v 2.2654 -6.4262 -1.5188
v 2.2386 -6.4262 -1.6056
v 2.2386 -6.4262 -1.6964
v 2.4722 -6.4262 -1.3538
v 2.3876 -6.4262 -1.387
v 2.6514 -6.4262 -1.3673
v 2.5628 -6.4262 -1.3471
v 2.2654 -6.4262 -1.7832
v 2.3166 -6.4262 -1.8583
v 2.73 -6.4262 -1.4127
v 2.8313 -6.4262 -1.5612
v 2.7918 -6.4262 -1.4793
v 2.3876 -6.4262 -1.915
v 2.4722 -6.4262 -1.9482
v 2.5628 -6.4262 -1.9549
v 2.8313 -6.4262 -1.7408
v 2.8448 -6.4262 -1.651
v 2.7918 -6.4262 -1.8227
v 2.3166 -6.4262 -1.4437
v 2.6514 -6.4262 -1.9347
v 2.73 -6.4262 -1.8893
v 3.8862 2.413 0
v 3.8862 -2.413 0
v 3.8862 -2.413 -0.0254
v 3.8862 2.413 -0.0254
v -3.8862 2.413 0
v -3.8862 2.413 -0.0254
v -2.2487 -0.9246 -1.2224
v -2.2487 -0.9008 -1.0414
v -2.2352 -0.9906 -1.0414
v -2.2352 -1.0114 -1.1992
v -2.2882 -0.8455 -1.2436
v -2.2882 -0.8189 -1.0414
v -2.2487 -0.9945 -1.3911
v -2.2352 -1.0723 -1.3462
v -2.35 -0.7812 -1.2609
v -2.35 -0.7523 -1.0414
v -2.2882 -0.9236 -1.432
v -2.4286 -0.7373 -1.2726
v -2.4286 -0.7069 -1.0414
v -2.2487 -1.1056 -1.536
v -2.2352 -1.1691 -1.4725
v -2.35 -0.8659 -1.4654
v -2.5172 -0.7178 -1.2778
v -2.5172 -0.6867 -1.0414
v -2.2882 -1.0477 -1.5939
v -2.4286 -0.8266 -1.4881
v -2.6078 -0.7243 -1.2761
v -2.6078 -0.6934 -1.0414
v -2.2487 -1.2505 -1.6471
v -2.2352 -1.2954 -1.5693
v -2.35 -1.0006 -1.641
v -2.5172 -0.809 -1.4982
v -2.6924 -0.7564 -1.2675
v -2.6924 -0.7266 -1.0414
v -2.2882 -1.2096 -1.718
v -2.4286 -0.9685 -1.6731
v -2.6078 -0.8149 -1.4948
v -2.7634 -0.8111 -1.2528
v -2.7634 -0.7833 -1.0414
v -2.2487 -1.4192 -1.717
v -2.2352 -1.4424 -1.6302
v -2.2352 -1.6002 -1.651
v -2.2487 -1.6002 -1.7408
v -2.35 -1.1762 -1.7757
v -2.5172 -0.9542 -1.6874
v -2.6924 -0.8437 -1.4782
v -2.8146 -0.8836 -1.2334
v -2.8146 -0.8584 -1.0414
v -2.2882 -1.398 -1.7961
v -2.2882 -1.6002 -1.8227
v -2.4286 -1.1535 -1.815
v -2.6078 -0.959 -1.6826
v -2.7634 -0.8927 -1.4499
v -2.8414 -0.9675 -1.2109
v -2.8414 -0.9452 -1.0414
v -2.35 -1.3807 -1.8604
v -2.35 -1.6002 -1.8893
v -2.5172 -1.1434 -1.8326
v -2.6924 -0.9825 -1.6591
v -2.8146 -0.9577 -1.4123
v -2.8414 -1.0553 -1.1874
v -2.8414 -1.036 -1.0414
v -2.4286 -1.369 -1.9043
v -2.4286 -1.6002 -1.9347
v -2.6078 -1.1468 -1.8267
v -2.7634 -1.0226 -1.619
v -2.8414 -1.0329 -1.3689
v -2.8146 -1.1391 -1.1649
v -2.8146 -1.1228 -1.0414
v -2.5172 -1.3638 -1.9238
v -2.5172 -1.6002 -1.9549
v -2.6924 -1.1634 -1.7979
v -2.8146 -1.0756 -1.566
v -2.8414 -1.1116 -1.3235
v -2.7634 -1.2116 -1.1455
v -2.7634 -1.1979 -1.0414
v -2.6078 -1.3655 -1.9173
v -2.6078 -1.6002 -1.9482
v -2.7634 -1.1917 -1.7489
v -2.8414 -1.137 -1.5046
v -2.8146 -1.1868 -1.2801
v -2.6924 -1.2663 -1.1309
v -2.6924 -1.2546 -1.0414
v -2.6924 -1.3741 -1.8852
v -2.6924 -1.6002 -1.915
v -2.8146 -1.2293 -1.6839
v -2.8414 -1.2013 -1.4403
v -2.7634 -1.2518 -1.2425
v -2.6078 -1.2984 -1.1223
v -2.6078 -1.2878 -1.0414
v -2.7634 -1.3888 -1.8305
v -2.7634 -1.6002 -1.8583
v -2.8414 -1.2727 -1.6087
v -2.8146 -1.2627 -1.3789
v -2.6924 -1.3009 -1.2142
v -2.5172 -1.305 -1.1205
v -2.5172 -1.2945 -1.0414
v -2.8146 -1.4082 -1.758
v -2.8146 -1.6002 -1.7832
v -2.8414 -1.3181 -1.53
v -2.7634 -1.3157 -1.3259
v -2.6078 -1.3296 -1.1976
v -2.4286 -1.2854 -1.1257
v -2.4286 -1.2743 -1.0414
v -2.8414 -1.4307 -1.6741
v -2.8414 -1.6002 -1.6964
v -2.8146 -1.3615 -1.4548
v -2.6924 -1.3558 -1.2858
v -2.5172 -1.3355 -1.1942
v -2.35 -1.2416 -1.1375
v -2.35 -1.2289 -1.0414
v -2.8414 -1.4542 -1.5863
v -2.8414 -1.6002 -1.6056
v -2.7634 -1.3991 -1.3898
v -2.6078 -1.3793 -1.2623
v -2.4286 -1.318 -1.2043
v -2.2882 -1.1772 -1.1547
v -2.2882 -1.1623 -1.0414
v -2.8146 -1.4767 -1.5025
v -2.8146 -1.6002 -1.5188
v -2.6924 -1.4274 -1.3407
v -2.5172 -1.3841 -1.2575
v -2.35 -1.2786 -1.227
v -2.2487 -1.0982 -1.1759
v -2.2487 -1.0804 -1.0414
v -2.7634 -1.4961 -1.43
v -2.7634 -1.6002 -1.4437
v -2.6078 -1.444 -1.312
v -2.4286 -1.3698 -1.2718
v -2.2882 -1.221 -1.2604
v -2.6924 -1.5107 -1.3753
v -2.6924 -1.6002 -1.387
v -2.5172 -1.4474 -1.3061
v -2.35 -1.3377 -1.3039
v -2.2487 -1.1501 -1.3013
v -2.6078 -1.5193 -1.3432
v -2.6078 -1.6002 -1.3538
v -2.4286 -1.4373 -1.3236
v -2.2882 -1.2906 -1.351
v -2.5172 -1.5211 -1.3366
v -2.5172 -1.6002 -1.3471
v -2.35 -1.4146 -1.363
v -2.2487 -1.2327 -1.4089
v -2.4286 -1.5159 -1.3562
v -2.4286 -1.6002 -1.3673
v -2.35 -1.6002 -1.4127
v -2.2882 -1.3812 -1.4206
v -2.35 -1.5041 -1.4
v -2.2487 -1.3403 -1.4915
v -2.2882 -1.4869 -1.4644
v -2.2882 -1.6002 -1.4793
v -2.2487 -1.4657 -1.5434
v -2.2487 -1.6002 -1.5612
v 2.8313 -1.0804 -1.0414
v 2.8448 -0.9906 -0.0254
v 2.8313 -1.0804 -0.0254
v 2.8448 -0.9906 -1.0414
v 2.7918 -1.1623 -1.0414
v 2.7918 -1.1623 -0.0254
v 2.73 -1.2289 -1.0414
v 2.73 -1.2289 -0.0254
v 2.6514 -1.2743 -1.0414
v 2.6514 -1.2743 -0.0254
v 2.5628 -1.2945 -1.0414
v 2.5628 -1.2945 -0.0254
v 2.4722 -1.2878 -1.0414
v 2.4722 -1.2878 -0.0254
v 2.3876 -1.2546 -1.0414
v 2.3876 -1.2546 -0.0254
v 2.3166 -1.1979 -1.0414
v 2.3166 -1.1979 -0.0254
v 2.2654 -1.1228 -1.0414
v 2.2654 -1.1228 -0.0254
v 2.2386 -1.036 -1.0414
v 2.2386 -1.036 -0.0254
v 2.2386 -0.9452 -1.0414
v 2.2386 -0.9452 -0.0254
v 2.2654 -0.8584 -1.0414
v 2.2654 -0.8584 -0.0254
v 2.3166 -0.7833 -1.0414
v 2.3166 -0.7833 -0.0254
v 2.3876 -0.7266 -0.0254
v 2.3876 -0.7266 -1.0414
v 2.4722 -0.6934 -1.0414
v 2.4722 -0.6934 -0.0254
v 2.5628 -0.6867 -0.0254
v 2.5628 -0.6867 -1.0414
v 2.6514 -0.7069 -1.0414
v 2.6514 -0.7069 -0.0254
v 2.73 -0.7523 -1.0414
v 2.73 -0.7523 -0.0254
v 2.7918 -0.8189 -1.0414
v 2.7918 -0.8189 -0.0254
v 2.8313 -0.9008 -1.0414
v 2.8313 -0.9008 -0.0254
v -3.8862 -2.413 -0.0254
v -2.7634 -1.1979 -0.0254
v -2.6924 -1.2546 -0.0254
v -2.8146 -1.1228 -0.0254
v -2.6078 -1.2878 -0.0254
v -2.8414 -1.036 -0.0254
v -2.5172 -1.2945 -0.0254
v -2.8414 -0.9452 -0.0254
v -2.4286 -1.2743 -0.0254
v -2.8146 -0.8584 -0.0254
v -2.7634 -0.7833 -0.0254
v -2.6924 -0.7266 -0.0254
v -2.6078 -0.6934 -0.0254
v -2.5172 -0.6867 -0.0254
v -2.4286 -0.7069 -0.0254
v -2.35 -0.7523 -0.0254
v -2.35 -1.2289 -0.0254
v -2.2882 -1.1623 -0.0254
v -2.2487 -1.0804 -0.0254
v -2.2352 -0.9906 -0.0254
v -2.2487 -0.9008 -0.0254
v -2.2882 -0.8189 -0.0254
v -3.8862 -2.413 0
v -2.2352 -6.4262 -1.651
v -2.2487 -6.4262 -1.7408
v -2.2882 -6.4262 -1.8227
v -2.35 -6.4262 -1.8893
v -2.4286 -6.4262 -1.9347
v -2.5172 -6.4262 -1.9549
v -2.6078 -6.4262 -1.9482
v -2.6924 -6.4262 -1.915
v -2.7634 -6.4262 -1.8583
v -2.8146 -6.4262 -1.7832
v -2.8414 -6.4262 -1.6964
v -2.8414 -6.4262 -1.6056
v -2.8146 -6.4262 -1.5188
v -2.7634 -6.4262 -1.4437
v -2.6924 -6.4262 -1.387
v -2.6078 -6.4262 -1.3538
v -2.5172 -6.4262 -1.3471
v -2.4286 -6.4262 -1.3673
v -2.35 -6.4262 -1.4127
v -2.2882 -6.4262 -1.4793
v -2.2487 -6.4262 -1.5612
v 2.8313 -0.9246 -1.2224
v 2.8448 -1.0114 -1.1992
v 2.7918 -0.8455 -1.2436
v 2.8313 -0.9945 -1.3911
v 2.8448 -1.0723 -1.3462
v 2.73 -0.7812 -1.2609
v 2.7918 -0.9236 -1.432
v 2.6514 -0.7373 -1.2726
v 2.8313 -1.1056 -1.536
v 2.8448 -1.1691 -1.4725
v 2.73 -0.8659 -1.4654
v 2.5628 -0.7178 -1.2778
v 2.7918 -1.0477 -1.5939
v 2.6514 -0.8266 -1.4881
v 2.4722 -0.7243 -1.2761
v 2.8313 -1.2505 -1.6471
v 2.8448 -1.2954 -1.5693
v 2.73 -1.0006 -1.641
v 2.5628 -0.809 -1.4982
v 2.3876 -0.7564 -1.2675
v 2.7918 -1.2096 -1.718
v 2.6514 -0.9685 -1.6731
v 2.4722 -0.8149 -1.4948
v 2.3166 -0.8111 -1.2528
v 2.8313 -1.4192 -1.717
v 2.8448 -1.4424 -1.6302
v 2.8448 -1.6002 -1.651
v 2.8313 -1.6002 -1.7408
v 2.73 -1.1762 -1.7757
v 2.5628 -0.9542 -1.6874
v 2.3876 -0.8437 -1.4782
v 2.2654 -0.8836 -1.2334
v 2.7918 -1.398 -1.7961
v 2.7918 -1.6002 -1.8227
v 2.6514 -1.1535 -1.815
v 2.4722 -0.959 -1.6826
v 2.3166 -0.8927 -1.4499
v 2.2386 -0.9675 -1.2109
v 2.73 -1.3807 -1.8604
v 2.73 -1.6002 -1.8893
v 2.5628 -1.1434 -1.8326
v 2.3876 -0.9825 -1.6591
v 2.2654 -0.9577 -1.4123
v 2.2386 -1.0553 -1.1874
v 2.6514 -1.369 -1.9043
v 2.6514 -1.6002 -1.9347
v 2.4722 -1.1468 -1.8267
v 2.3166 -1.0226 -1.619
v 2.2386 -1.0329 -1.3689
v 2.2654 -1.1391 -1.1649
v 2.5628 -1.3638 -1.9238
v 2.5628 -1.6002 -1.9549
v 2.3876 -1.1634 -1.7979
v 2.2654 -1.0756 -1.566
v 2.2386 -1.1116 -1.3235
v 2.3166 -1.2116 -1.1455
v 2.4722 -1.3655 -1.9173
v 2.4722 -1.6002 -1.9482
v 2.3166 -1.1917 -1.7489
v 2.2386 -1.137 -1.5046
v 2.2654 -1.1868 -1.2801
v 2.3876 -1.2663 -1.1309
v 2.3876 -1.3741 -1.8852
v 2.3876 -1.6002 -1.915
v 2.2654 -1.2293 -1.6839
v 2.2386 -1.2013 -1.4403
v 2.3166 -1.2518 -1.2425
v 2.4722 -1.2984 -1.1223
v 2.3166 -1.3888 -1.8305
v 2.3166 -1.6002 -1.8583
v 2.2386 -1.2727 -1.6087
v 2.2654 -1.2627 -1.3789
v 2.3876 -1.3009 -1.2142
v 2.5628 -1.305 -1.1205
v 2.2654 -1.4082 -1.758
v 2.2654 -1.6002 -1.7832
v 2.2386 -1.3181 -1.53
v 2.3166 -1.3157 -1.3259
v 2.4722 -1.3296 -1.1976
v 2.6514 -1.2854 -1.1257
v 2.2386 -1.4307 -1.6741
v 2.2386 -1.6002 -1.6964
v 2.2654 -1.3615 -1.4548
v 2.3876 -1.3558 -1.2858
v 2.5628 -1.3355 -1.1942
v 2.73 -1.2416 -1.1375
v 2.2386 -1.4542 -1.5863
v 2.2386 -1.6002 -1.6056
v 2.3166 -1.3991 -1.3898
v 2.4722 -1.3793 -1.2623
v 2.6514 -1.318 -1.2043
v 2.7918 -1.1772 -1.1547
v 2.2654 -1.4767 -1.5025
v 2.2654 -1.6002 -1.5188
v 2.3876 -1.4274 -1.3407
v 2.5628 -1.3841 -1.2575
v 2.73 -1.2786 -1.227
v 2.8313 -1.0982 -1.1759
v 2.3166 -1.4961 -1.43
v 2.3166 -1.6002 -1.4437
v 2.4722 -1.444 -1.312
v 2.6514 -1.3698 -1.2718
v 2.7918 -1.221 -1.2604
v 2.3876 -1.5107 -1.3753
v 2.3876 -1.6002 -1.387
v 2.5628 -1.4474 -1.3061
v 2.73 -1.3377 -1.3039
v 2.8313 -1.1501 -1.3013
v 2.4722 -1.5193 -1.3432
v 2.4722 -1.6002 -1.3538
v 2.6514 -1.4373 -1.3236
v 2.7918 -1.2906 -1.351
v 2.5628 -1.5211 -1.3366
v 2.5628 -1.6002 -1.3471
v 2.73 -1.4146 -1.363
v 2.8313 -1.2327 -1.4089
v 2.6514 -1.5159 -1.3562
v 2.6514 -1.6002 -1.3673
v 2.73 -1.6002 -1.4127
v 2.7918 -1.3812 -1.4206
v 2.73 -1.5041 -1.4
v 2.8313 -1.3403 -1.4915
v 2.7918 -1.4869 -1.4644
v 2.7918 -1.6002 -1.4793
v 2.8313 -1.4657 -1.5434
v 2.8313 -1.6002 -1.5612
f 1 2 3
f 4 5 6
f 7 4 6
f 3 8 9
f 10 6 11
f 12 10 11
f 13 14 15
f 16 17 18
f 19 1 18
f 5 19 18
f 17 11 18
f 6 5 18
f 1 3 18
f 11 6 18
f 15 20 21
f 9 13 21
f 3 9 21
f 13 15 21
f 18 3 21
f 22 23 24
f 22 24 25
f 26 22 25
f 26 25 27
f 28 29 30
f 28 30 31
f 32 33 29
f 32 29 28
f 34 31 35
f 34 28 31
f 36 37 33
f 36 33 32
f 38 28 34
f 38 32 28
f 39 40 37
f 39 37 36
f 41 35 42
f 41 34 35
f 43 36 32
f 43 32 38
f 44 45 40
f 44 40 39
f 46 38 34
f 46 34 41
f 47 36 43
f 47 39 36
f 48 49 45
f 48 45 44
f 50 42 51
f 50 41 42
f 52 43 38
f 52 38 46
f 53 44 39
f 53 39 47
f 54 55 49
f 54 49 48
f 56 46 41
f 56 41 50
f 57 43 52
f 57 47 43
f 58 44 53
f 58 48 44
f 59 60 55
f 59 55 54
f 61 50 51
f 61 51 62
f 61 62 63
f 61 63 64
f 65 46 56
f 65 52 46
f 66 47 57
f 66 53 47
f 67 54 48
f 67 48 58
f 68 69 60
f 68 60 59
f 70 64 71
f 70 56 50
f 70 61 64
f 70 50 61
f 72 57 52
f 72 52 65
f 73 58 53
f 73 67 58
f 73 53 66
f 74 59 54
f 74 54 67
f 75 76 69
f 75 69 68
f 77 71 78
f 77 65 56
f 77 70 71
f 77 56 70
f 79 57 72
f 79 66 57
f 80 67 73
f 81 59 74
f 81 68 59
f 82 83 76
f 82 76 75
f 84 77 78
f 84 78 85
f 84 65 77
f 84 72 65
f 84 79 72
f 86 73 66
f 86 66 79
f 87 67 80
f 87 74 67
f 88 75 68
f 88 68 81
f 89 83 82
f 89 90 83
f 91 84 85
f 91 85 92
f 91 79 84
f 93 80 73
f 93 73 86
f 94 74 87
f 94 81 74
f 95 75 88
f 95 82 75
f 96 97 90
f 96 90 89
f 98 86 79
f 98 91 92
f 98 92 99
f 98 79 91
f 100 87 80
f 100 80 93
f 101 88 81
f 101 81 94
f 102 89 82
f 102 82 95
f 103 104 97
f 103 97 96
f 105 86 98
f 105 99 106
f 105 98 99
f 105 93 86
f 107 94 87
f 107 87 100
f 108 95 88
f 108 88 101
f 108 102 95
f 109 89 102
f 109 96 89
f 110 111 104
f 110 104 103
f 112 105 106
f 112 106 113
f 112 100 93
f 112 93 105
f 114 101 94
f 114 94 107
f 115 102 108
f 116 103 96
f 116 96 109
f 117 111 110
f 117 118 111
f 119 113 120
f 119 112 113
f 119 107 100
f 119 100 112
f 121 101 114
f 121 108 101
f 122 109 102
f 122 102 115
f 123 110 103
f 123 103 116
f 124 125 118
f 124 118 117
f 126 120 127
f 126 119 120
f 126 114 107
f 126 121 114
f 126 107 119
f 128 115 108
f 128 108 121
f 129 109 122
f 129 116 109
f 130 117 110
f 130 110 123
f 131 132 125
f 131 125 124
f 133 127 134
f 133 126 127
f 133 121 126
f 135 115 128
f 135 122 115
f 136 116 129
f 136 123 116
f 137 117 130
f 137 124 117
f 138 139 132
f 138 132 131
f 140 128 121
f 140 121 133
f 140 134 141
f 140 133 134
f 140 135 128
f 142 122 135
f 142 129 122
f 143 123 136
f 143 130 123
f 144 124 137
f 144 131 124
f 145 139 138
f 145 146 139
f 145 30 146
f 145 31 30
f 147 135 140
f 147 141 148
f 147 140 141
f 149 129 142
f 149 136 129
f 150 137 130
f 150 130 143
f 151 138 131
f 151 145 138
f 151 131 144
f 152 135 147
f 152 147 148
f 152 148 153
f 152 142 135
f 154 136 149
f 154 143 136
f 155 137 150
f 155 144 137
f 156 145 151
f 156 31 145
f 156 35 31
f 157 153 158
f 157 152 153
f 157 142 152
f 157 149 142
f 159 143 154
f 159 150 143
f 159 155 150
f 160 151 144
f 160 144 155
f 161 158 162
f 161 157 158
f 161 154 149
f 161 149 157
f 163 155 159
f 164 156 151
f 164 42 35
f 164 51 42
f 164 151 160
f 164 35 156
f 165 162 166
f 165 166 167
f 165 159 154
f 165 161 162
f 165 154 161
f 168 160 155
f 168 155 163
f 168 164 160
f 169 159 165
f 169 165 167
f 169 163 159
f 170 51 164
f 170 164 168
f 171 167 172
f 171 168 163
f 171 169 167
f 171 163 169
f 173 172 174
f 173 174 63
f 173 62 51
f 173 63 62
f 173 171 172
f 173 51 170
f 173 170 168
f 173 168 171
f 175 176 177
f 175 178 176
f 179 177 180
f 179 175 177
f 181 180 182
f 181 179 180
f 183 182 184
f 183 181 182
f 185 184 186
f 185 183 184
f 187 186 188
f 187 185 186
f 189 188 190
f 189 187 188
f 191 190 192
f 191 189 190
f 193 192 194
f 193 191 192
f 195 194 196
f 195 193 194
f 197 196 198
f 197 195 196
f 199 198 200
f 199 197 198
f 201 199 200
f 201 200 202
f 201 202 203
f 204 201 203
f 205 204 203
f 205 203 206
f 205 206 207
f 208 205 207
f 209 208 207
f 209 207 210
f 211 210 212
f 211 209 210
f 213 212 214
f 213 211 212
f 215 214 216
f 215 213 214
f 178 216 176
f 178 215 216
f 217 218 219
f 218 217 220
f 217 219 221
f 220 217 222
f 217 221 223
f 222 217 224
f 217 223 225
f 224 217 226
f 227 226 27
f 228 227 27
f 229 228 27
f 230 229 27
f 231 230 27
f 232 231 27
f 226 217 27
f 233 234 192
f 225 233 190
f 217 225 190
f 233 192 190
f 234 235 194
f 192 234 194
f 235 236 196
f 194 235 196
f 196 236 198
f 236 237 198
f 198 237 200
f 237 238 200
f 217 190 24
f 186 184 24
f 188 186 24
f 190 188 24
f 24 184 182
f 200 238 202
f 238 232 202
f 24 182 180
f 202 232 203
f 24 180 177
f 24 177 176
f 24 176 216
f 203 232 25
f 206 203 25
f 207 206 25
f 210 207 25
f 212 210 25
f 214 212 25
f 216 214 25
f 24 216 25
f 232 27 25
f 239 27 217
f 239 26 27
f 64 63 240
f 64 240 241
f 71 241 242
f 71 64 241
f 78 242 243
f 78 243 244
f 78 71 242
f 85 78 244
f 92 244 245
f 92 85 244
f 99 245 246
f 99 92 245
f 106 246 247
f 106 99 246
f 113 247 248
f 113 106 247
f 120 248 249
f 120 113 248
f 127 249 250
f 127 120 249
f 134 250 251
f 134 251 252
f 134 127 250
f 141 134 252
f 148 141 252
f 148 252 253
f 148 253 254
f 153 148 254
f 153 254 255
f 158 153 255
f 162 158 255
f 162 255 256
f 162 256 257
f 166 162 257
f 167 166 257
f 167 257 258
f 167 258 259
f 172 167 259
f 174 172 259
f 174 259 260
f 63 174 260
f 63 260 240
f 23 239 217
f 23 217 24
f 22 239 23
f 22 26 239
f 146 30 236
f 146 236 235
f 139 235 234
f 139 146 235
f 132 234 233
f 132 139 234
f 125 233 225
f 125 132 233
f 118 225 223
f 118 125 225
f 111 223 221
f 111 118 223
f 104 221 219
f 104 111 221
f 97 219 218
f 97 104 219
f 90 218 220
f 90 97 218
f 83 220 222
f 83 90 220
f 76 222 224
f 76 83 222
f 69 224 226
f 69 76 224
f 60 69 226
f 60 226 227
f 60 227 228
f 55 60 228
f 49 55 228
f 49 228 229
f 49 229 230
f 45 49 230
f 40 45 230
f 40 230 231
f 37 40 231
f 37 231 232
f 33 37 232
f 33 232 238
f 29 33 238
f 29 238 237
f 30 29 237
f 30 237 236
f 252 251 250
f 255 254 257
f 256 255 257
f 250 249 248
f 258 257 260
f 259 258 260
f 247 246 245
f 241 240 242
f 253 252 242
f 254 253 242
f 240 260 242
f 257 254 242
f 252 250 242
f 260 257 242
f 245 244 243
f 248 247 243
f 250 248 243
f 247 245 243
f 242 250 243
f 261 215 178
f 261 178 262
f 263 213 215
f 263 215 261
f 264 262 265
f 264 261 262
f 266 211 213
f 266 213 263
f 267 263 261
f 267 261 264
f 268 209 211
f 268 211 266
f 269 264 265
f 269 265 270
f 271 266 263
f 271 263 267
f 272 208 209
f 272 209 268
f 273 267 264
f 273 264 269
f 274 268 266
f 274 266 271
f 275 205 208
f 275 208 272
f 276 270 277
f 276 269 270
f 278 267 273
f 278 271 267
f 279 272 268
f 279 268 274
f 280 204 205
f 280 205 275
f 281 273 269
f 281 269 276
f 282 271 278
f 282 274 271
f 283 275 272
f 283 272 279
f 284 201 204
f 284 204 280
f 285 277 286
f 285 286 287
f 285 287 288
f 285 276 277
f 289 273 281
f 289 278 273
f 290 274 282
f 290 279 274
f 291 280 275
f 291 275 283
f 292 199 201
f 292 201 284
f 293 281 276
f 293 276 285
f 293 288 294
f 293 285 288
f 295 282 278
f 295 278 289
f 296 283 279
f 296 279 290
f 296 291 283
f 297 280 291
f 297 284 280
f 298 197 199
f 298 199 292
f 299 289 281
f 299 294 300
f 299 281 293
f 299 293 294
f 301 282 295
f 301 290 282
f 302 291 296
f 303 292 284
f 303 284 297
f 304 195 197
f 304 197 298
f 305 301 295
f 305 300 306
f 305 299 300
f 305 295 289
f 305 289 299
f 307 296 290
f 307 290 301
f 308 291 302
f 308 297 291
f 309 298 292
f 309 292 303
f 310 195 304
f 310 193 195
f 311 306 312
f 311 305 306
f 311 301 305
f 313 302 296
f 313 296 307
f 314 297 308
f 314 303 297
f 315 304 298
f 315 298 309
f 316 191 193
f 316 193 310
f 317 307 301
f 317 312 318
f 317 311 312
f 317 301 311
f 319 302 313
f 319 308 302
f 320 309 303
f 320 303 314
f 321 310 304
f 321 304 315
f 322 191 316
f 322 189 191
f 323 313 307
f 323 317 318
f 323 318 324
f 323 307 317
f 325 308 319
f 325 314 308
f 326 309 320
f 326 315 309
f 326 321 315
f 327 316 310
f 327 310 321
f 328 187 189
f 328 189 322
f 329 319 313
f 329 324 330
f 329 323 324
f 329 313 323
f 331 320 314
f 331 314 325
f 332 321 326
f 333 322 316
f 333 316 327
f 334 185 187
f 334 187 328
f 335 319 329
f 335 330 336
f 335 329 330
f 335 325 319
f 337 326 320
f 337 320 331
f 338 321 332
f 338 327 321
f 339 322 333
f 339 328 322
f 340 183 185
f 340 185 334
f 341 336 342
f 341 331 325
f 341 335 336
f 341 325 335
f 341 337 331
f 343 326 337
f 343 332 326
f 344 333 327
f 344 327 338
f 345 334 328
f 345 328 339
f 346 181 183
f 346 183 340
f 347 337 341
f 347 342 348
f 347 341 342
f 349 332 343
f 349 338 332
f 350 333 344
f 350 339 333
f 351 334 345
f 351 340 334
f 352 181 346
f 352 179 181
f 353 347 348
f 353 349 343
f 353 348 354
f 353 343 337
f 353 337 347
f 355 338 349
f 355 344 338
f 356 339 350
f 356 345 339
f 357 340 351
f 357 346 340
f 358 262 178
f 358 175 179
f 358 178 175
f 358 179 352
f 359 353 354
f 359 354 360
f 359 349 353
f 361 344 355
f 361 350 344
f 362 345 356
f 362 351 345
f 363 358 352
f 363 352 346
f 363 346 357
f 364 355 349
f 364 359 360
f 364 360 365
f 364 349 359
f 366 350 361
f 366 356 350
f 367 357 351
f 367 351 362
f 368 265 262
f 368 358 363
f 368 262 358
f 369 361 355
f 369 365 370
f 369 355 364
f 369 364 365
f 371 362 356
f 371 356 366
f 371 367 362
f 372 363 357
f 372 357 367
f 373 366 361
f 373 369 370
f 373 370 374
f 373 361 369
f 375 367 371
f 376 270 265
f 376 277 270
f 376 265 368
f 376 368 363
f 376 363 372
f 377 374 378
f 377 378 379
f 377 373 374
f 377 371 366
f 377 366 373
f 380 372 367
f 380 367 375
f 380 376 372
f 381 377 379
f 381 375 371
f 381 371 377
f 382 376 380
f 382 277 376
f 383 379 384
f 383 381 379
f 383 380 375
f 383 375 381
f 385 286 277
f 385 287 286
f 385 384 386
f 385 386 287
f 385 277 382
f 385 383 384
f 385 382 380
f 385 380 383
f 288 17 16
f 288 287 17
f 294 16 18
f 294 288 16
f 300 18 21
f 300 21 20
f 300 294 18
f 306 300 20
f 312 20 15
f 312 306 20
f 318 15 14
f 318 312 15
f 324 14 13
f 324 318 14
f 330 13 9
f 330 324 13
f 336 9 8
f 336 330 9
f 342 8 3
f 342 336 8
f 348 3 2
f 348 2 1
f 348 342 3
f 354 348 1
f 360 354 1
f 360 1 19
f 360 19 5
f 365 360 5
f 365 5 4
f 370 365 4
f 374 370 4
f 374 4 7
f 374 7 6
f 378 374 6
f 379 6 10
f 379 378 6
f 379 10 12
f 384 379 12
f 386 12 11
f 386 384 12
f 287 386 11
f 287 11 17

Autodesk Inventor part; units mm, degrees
sketch "Sketch_1" plane through (0, 0, 0) normal (0, 0, 1) x (1, 0, 0)
  line L0 (-3.8862, 2.413) -> (-3.8862, -2.413)
  line L1 (-3.8862, -2.413) -> (3.8862, -2.413)
  line L2 (3.8862, -2.413) -> (3.8862, 2.413)
  line L3 (3.8862, 2.413) -> (-3.8862, 2.413)
extrude "Extrusion1" add sketch "Sketch_1" against normal blind 0.0254
sketch "Sketch_2" plane through (0, 0, -1.0414) normal (0, 0, 1) x (1, 0, 0)
  circle A0 centre (-2.54, -0.9906) radius 0.3048
extrude "Extrusion2" add sketch "Sketch_2" along normal blind 1.0414
sketch "Sketch_5" plane through (0, 0, -1.0414) normal (0, 0, 1) x (1, 0, 0)
  circle A0 centre (2.54, -0.9906) radius 0.3048
extrude "Extrusion3" add sketch "Sketch_5" along normal blind 1.0414
sketch "Sketch_6" plane through (0, 0, -1.0414) normal (0, 0, 1) x (1, 0, 0)
  line L0 (3.81, -1.6002) -> (-3.81, -1.6002)
  circle A0 centre (-2.54, -0.9906) radius 0.3048
revolve "Revolution1" add sketch "Sketch_6" angle 90 about axis through (3.81, -1.6002, -1.0414) along (-1, 0, 0)
sketch "Sketch_7" plane through (0, 0, -1.0414) normal (0, 0, 1) x (1, 0, 0)
  line L0 (2.54, -1.6002) -> (-2.54, -1.6002)
  circle A0 centre (2.54, -0.9906) radius 0.3048
revolve "Revolution2" add sketch "Sketch_7" angle 90 about axis through (2.54, -1.6002, -1.0414) along (-1, 0, 0)
sketch "Sketch_9" plane through (0, -1.6002, 0) normal (0, 1, 0) x (1, 0, 0)
  circle A0 centre (-2.54, 1.651) radius 0.3048
extrude "Extrusion4" add sketch "Sketch_9" against normal blind 4.826
sketch "Sketch_10" plane through (0, -1.6002, 0) normal (0, 1, 0) x (1, 0, 0)
  circle A0 centre (2.54, 1.651) radius 0.3048
extrude "Extrusion5" add sketch "Sketch_10" against normal blind 4.826
ref_plane "right_body_XY" through (0, 0, 0) normal (0, 0, -1) x (1, 0, 0)
ref_plane "right_body_YZ" through (0, 0, 0) normal (1, 0, 0) x (0, -1, 0)
ref_plane "right_body_ZX" through (0, 0, 0) normal (0, -1, 0) x (0, 0, -1)
properties part number "AS11CHtrh"
